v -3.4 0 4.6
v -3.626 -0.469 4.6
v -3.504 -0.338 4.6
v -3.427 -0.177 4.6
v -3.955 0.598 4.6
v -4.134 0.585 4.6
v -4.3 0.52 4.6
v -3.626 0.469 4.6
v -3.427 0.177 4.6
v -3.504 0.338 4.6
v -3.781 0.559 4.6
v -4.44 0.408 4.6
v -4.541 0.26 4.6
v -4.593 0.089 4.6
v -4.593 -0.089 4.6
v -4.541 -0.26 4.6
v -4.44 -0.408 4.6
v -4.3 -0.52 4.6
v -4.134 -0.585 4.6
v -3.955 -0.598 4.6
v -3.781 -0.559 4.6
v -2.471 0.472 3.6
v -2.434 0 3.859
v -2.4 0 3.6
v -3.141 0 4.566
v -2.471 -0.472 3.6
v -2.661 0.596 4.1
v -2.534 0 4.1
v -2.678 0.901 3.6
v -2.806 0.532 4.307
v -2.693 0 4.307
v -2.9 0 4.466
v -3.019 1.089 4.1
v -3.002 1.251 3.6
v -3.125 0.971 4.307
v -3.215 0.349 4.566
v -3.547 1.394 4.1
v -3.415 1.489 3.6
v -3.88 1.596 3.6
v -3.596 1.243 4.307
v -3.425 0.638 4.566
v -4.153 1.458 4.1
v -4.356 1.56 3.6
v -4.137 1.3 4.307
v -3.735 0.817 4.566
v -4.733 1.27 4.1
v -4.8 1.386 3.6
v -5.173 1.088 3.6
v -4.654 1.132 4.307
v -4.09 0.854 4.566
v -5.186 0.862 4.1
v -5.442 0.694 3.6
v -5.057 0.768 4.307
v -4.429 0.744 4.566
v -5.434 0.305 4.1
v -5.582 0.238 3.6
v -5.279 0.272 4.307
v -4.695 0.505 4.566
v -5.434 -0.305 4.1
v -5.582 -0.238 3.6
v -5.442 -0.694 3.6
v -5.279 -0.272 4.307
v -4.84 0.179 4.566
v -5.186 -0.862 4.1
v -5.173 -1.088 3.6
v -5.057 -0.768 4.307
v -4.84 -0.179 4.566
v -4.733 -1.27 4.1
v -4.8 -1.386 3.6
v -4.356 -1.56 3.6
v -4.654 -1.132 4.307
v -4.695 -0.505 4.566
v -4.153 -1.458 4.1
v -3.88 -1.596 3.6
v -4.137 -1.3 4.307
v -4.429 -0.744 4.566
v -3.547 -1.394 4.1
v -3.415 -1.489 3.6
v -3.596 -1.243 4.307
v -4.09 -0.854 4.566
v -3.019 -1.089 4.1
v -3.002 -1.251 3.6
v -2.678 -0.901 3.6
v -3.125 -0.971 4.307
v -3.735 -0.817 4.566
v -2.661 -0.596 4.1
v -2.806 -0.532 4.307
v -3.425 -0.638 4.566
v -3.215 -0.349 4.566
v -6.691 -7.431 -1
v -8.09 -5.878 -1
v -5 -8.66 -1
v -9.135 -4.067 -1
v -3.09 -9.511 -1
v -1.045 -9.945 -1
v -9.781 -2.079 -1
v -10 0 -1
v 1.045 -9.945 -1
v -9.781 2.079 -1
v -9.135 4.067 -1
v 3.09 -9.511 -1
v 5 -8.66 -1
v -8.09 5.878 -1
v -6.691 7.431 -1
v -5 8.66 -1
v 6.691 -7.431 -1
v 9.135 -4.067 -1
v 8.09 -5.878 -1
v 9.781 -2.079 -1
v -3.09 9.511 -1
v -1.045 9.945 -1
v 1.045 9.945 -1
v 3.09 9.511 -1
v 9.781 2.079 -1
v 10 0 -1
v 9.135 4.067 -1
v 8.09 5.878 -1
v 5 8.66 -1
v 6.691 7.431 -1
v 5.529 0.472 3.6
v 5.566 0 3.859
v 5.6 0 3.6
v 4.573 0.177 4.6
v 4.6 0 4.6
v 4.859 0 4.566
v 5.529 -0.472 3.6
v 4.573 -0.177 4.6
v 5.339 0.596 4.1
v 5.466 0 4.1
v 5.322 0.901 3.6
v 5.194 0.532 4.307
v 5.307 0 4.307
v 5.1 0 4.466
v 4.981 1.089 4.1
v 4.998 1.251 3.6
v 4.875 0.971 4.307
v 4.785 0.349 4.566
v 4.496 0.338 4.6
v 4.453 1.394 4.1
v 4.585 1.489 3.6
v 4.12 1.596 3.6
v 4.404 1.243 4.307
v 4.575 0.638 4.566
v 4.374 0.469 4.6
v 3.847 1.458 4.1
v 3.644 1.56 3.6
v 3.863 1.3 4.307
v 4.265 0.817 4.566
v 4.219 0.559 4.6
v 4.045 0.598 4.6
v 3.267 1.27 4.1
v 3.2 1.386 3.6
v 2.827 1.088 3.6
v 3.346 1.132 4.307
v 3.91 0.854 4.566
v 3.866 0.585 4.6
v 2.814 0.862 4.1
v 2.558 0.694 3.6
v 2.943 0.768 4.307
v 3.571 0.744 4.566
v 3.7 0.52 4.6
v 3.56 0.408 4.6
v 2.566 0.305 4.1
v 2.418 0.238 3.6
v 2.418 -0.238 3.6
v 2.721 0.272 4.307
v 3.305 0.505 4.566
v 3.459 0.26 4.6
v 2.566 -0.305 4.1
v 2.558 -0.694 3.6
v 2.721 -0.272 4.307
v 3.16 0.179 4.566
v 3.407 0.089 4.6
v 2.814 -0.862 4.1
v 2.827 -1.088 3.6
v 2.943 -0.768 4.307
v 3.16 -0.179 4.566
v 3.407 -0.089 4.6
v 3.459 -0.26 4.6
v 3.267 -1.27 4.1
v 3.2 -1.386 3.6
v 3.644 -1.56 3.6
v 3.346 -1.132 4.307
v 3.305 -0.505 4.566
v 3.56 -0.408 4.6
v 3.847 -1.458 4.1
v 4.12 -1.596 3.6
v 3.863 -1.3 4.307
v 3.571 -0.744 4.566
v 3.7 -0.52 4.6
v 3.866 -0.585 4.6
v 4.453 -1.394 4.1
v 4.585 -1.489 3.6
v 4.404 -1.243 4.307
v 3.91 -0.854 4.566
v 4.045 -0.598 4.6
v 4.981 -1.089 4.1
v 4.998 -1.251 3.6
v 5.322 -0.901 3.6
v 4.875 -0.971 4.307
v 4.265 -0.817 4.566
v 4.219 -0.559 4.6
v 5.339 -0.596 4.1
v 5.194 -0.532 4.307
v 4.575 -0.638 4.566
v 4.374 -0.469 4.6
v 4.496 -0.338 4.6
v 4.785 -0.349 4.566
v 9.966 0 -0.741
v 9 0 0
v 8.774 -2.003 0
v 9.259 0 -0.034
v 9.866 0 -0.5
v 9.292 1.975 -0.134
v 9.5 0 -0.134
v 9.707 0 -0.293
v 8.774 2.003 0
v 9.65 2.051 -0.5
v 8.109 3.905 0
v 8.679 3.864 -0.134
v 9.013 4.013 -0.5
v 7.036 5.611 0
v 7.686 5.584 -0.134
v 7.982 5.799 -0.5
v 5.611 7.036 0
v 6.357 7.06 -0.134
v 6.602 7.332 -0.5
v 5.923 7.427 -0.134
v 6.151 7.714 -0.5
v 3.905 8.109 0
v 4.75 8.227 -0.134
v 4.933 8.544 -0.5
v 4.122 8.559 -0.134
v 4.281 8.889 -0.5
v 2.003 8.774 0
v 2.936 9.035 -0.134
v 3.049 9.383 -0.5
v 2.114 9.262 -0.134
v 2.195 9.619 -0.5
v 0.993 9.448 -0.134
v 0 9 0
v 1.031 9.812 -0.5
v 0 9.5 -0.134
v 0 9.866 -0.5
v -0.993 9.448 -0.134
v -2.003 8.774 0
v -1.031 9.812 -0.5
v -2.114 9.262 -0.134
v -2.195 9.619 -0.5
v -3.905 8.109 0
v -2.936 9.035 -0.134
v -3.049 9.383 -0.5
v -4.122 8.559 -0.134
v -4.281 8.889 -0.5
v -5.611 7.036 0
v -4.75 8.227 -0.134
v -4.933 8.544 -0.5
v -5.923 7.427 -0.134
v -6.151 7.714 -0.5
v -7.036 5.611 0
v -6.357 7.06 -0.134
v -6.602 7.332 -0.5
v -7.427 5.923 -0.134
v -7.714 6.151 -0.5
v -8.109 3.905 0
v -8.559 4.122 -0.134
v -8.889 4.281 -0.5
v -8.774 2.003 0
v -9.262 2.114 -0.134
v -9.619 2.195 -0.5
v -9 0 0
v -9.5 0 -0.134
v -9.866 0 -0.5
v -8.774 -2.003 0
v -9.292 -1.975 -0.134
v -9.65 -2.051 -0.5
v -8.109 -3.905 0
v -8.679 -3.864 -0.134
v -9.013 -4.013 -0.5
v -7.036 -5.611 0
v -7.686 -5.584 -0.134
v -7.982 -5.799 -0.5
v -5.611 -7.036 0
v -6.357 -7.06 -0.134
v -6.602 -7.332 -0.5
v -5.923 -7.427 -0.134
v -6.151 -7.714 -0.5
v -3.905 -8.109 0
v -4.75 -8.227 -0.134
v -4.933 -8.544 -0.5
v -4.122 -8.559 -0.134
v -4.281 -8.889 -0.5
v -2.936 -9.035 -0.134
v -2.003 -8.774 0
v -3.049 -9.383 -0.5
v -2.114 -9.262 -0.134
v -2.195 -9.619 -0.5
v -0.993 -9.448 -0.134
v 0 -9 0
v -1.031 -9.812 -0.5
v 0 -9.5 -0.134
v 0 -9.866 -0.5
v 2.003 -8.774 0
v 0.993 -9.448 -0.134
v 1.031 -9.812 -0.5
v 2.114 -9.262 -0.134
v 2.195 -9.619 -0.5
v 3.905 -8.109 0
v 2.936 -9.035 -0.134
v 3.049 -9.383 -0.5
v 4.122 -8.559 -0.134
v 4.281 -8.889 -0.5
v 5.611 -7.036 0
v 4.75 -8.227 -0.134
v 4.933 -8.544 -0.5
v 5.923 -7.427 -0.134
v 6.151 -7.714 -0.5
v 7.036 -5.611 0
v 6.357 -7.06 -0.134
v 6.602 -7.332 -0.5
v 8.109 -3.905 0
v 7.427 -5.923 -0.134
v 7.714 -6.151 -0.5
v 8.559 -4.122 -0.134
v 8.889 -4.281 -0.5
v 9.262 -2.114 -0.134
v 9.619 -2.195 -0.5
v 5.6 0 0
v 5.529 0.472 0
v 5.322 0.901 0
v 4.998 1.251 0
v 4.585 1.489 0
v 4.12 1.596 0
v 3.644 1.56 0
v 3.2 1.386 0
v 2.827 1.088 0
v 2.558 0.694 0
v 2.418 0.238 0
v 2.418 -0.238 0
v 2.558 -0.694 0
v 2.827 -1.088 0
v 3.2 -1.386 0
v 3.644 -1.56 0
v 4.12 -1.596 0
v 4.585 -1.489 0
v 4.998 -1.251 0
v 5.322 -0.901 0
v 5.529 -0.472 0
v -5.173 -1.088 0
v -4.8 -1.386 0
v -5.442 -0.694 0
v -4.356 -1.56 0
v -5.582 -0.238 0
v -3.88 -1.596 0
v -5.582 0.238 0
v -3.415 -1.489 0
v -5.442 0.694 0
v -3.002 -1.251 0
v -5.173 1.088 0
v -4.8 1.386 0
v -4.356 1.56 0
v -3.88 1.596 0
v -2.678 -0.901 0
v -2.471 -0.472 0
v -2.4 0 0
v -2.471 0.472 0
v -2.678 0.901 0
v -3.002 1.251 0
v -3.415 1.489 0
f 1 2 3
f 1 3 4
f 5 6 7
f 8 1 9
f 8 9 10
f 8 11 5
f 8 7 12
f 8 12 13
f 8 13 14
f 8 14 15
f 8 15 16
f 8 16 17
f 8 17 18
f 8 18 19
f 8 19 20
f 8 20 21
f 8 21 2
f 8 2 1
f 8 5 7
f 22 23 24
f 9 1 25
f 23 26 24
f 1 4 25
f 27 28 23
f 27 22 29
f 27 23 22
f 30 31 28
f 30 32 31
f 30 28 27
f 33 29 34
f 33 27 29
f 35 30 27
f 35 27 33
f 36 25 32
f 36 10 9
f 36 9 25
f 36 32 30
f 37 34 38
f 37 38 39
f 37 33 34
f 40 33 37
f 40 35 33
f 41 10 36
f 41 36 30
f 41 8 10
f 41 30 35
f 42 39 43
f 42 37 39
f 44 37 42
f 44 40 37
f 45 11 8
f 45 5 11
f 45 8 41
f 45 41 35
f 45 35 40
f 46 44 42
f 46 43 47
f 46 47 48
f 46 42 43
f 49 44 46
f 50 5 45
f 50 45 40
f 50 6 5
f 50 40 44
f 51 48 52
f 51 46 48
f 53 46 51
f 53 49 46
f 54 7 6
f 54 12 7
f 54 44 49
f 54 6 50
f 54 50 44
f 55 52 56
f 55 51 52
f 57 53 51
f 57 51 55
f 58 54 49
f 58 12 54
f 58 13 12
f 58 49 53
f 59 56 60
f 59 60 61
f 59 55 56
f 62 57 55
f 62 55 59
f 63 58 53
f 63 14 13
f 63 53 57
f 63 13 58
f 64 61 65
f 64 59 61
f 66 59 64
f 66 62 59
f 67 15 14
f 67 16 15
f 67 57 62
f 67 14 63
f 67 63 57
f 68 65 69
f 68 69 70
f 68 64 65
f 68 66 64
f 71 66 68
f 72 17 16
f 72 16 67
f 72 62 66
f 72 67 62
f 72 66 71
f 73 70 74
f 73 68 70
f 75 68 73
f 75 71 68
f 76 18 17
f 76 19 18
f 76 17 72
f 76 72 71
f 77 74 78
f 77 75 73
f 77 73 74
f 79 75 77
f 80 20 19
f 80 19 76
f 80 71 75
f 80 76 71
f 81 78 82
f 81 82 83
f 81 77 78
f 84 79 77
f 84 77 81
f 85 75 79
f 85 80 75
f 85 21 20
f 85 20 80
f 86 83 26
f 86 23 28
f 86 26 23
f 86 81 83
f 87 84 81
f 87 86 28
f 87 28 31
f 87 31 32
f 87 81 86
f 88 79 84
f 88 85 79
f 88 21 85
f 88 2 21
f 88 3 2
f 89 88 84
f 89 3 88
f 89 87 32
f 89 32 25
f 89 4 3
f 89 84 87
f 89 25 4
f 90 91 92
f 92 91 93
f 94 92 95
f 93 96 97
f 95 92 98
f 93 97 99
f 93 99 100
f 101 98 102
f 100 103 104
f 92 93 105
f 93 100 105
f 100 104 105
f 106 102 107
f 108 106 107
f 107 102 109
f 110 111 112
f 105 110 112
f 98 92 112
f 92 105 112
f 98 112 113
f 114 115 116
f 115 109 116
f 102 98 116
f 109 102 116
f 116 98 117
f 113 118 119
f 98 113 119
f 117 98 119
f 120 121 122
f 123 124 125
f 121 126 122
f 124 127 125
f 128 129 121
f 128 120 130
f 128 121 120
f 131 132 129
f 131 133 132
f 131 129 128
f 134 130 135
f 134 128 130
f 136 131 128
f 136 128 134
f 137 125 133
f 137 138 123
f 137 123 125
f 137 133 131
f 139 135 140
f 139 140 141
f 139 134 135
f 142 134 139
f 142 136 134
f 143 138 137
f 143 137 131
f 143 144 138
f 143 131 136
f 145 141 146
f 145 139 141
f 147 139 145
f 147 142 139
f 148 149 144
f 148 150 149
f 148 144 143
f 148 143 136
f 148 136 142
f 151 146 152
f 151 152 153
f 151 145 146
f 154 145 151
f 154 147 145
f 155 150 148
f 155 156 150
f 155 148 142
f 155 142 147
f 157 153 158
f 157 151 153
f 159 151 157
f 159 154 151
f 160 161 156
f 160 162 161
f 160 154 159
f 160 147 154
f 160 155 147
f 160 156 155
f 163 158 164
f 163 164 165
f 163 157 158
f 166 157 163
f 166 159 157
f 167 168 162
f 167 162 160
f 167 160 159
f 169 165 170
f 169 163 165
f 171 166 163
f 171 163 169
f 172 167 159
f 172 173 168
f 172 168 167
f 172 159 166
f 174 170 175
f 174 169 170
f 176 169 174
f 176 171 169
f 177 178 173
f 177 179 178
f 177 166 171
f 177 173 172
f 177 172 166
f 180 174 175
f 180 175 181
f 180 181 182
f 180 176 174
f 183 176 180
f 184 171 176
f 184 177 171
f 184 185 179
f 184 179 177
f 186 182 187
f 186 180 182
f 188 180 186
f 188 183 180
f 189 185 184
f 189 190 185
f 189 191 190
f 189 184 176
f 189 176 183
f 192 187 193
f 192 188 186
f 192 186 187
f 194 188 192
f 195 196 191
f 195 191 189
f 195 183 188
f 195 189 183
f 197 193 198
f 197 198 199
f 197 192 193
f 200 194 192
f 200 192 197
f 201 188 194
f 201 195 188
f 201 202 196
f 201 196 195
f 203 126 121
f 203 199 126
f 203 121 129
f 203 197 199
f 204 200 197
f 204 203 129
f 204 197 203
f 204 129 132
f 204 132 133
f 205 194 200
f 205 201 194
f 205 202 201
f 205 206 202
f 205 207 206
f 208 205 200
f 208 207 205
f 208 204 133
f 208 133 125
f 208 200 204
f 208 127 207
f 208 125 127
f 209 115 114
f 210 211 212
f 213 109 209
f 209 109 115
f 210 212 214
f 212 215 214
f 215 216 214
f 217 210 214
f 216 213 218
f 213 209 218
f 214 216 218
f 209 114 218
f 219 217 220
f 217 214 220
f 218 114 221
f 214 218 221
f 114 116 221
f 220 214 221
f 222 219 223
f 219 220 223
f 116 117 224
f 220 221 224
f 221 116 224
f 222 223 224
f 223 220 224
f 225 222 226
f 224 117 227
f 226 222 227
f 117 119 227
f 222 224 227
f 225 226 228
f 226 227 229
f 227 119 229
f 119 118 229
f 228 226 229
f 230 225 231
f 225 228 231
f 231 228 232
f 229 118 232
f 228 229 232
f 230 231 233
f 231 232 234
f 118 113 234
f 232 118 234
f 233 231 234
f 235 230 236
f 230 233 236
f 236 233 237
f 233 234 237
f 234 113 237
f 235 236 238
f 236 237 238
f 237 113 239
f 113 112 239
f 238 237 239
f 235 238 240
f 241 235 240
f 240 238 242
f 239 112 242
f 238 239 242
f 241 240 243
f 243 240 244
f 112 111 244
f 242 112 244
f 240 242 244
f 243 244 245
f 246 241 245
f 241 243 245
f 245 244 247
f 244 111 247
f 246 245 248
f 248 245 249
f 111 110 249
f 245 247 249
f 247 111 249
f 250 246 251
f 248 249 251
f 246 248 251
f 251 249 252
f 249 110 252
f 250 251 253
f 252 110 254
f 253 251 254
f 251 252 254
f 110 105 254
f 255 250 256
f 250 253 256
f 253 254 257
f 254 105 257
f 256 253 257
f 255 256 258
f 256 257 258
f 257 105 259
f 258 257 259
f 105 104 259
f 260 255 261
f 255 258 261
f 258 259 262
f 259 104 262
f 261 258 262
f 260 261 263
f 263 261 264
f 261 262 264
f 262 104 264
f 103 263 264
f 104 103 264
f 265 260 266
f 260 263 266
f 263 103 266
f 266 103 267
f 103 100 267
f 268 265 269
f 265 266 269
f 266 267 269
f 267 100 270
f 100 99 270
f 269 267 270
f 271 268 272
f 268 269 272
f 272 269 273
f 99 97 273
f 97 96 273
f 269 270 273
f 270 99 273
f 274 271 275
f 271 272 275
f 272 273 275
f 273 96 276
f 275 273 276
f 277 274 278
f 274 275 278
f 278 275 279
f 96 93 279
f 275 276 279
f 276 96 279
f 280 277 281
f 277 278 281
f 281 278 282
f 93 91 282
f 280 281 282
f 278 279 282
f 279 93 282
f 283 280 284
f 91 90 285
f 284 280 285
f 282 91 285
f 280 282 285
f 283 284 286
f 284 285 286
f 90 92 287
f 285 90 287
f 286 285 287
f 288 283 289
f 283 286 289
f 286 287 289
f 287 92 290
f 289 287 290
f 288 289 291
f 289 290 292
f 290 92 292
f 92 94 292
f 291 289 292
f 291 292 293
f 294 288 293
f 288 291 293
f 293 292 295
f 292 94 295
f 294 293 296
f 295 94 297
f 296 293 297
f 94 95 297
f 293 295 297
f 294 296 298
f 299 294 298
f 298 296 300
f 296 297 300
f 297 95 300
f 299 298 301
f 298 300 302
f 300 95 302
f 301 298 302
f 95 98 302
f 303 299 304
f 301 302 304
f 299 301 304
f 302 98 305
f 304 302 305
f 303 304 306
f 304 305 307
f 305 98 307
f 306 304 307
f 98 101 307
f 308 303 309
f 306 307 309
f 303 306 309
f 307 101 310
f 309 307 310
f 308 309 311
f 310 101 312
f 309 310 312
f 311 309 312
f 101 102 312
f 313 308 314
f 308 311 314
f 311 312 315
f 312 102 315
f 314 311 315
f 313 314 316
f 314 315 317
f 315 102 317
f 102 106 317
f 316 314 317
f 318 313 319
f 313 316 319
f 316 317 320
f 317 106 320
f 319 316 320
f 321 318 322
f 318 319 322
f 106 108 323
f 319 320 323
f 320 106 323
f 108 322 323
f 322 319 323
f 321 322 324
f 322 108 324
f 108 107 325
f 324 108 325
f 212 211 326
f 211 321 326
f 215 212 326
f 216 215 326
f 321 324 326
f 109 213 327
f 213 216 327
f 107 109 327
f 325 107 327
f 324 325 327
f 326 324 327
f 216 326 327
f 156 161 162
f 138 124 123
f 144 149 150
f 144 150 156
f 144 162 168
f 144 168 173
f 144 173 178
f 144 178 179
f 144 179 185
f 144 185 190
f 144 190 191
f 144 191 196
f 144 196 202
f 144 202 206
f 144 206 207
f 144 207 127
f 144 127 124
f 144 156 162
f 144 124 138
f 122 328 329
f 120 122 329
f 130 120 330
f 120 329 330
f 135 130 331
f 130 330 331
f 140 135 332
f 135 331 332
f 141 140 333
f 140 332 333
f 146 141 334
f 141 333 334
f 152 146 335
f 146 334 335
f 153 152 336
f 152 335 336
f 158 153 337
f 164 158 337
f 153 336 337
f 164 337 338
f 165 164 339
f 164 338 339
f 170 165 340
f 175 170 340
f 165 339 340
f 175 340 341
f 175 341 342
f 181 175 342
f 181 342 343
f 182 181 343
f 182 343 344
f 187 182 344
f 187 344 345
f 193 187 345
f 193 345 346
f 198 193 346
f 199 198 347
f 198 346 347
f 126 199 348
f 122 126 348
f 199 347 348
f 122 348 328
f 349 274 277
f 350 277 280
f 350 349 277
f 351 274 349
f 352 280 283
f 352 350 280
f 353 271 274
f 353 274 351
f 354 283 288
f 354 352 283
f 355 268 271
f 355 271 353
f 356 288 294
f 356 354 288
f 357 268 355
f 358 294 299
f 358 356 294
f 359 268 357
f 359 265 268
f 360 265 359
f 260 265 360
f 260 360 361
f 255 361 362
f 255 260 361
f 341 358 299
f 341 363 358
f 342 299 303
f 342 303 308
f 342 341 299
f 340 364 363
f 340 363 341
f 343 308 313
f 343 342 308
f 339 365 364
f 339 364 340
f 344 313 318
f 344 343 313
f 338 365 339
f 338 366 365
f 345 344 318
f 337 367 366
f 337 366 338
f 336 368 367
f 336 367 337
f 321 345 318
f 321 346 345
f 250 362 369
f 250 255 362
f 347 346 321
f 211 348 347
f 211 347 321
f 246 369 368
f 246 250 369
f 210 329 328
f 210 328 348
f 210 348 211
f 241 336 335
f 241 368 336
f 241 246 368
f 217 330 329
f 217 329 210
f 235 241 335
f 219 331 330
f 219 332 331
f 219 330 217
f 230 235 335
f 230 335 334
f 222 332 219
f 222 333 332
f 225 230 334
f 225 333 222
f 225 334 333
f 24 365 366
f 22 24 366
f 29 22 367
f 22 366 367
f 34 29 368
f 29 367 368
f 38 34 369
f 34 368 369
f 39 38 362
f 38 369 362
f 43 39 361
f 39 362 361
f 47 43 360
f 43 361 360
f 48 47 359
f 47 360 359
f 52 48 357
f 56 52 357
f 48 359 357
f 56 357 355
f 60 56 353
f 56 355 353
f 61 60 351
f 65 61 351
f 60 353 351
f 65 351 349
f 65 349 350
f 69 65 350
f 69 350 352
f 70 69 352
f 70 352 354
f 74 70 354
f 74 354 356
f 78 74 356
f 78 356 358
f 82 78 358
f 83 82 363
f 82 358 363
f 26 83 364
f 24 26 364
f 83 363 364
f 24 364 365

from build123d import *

# Parameters (mm, degrees)
F0_R     = 10
F0_R_2   = 1.6
F1_DEPTH = 1
F2_DEPTH = 4.6
F3_R     = 1
F4_R     = 0.99999


# Not quite as in the source:
# - a fillet or chamfer is up to 0.001 mm smaller than in the source, because OpenCascade refuses the exact size


with BuildPart() as f1:
    # F0 (on Top) → F1 (new body)
    with BuildSketch(Plane.XY):
        Circle(F0_R)
        with Locations((-4, 0)):
            Circle(F0_R_2, mode=Mode.SUBTRACT)
        with Locations((4, 0)):
            Circle(F0_R_2, mode=Mode.SUBTRACT)
        with Locations((-4, 0)):
            Circle(F0_R_2)
        with Locations((4, 0)):
            Circle(F0_R_2)
    extrude(amount=-F1_DEPTH)

    # F0 (on Top) → F2 (join)
    with BuildSketch(Plane.XY):
        with Locations((-4, 0)):
            Circle(F0_R_2)
        with Locations((4, 0)):
            Circle(F0_R_2)
    extrude(amount=F2_DEPTH)

    # F3
    f3_edges = [f1.edges().sort_by_distance(p)[0] for p in [
        (-5.6, 0, 4.6),
        (2.4, 0, 4.6),
    ]]
    fillet(f3_edges, radius=F3_R)

    # F4 (radius 1 in the source; OpenCascade refuses exactly that, so slightly less here)
    f4_edges = [f1.edges().sort_by_distance(p)[0] for p in [
        (-10, 0, 0),
    ]]
    fillet(f4_edges, radius=F4_R)


solid = f1.part
